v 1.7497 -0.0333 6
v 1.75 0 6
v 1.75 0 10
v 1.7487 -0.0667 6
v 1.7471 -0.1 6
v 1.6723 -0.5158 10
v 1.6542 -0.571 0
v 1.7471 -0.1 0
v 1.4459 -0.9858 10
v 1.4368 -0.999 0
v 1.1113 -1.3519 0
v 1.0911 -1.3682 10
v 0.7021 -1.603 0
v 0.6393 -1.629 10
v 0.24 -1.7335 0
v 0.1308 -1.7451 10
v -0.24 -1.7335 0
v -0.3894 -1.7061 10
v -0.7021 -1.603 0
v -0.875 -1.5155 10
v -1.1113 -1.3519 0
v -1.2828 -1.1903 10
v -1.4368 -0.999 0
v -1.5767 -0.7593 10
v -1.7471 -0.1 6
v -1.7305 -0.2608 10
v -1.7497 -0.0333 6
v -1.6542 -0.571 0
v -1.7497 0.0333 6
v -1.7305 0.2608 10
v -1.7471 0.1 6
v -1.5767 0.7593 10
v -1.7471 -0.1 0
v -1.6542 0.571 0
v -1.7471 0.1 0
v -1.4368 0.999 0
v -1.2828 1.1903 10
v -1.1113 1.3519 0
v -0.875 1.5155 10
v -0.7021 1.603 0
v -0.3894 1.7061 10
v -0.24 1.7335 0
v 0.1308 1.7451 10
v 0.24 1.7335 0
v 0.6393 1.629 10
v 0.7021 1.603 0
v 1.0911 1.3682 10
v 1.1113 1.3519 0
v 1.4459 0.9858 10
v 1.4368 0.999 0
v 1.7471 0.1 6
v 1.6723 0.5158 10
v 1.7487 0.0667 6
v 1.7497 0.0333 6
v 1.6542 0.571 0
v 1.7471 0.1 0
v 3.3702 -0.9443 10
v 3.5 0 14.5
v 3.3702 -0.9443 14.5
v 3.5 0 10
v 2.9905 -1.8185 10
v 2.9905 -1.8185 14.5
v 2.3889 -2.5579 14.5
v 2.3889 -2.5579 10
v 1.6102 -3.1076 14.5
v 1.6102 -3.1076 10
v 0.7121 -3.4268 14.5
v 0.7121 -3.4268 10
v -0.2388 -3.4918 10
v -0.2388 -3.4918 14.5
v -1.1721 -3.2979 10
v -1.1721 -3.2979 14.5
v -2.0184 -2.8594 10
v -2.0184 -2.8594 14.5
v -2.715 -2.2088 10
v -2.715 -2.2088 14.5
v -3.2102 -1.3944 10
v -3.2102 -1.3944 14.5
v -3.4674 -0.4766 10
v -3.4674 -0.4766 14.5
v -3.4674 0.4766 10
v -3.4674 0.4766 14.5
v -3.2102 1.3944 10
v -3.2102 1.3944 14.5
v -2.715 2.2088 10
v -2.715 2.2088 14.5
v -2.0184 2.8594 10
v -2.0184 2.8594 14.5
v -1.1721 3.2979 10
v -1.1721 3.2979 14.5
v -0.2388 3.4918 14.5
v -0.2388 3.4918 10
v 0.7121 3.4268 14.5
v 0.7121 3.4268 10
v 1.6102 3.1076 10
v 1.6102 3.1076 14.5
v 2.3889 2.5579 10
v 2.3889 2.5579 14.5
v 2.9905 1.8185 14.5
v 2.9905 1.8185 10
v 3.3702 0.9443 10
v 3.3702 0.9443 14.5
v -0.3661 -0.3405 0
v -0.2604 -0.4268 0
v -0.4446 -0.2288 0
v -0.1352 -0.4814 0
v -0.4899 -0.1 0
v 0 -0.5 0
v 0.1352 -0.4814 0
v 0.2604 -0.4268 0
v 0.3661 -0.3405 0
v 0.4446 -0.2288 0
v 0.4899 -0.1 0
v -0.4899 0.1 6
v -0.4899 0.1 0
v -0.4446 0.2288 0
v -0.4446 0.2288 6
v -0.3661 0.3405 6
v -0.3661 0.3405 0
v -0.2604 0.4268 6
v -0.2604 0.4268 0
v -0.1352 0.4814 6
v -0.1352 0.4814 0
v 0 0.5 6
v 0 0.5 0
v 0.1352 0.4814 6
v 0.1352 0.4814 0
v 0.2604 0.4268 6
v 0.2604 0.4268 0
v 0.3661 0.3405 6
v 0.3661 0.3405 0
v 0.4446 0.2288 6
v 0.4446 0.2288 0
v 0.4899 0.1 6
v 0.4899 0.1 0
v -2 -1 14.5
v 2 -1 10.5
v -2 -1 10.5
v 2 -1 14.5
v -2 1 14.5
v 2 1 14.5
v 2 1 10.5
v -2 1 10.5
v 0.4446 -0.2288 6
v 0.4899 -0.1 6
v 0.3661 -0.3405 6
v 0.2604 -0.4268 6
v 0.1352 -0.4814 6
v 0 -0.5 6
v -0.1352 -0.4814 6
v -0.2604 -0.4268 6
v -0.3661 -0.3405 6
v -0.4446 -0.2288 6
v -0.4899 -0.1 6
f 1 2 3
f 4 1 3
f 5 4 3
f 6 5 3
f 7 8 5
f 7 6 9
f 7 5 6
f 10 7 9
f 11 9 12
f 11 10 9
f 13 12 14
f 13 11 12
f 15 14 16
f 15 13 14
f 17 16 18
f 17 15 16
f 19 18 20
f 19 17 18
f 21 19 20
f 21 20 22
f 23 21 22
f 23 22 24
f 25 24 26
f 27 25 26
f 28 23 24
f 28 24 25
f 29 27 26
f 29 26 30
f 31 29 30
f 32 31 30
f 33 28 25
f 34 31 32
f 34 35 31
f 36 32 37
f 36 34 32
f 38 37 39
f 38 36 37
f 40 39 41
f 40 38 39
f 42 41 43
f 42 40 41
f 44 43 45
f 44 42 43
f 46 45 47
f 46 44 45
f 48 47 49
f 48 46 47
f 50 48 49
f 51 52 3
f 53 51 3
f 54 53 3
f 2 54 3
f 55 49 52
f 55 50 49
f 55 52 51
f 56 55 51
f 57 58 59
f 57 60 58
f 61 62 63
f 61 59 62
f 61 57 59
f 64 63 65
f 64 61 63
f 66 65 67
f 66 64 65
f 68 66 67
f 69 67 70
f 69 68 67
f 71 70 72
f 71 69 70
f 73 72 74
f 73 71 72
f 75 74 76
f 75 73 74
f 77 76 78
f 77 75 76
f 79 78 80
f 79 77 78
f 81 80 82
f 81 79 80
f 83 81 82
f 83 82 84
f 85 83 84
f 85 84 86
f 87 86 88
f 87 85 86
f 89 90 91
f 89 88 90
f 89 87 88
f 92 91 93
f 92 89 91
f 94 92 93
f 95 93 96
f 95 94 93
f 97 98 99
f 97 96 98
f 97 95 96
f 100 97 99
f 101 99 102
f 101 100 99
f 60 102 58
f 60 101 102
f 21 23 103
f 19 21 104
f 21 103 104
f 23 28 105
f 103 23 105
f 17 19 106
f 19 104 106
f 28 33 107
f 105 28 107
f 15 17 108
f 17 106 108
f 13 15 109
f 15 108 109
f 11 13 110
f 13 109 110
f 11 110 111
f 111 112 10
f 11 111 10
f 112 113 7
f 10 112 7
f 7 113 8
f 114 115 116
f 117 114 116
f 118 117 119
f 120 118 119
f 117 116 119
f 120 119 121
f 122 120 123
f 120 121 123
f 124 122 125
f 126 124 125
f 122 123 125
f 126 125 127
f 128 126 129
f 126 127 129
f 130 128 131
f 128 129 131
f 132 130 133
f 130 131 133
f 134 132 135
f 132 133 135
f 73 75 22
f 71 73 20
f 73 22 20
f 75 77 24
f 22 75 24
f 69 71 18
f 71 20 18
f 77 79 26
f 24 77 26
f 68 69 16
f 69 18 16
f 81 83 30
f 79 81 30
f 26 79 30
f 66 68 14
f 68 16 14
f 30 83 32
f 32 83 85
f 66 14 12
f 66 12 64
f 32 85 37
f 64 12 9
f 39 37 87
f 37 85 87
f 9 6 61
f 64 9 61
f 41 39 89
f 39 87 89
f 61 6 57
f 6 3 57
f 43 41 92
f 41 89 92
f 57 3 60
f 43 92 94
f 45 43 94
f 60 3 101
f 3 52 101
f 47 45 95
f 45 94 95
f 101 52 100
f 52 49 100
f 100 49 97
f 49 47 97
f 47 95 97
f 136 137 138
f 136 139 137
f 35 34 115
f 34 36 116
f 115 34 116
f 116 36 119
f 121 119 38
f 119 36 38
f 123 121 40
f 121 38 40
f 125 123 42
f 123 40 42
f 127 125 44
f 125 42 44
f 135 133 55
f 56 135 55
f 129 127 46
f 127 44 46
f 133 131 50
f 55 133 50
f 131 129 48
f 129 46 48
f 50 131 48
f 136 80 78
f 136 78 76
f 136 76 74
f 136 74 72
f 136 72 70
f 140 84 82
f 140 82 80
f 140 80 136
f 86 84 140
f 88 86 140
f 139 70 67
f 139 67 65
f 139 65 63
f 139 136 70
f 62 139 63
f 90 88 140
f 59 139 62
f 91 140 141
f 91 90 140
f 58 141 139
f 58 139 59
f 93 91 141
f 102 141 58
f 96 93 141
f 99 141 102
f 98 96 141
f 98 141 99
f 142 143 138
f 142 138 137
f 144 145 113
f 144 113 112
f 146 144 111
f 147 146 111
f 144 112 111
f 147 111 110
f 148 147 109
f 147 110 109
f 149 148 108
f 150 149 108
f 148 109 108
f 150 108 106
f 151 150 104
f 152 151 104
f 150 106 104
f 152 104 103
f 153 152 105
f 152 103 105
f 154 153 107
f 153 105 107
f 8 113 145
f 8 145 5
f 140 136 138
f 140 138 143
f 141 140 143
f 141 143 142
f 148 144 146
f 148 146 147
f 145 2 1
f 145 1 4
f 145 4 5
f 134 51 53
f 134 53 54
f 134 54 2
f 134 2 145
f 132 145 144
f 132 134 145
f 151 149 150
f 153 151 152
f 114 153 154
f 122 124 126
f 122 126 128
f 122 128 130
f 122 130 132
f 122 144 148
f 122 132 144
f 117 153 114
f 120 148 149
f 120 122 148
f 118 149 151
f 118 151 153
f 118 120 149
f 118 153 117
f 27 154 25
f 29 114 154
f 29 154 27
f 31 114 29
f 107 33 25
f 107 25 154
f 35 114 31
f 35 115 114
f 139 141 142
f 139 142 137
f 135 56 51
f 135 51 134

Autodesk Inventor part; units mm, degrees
ref_plane "YZ Plane" through (0, 0, 0) normal (1, 0, 0) x (0, 1, 0)
ref_plane "XZ Plane" through (0, 0, 0) normal (0, 1, 0) x (-1, 0, 0)
ref_plane "XY Plane" through (0, 0, 0) normal (0, 0, 1) x (1, 0, 0)
sketch "Sketch1" plane through (0, 0, 0) normal (0, 0, 1) x (1, 0, 0)
  circle A0 centre (0, 0) radius 1.75
  dimension "d0" = 3.5
extrude "Extrusion1" add sketch "Sketch1" along normal blind 10
sketch "Sketch2" plane through (0, 0, 10) normal (0, 0, 1) x (1, 0, 0)
  circle A0 centre (0, 0) radius 3.5
  dimension "d3" = 7
extrude "Extrusion2" add sketch "Sketch2" along normal blind 4.5
sketch "Sketch3" plane through (0, 0, 14.5) normal (0, 0, 1) x (1, 0, 0)
  line L0 (-2, 1) -> (2, 1)
  line L1 (2, 1) -> (2, -1)
  line L2 (2, -1) -> (-2, -1)
  line L3 (-2, -1) -> (-2, 1)
  point P0 (0, 0)
  point P1 (-2, 0)
  point P2 (0, 1)
  dimension "d6" = 4
  dimension "d7" = 2
extrude "Extrusion3" cut sketch "Sketch3" against normal blind 4
sketch "Sketch4" plane through (0, 0, 0) normal (0, 0, -1) x (-1, 0, 0)
  circle A0 centre (0, 0) radius 0.5
  line L0 (2, -0.1) -> (-2, -0.1)
  line L1 (-2, -0.1) -> (-2, 0.1)
  line L2 (-2, 0.1) -> (2, 0.1)
  line L3 (2, 0.1) -> (2, -0.1)
  point P0 (0, -0.1)
  point P1 (2, 0)
  point P2 (-0.4899, 0.1)
  point P3 (-0.4899, -0.1)
  point P4 (0.4899, -0.1)
  point P5 (0.4899, 0.1)
  dimension "d10" = 1
  dimension "d11" = 4
  dimension "d12" = 0.2
extrude "Extrusion4" cut sketch "Sketch4" against normal blind 6
properties part number "Magnethalter"
